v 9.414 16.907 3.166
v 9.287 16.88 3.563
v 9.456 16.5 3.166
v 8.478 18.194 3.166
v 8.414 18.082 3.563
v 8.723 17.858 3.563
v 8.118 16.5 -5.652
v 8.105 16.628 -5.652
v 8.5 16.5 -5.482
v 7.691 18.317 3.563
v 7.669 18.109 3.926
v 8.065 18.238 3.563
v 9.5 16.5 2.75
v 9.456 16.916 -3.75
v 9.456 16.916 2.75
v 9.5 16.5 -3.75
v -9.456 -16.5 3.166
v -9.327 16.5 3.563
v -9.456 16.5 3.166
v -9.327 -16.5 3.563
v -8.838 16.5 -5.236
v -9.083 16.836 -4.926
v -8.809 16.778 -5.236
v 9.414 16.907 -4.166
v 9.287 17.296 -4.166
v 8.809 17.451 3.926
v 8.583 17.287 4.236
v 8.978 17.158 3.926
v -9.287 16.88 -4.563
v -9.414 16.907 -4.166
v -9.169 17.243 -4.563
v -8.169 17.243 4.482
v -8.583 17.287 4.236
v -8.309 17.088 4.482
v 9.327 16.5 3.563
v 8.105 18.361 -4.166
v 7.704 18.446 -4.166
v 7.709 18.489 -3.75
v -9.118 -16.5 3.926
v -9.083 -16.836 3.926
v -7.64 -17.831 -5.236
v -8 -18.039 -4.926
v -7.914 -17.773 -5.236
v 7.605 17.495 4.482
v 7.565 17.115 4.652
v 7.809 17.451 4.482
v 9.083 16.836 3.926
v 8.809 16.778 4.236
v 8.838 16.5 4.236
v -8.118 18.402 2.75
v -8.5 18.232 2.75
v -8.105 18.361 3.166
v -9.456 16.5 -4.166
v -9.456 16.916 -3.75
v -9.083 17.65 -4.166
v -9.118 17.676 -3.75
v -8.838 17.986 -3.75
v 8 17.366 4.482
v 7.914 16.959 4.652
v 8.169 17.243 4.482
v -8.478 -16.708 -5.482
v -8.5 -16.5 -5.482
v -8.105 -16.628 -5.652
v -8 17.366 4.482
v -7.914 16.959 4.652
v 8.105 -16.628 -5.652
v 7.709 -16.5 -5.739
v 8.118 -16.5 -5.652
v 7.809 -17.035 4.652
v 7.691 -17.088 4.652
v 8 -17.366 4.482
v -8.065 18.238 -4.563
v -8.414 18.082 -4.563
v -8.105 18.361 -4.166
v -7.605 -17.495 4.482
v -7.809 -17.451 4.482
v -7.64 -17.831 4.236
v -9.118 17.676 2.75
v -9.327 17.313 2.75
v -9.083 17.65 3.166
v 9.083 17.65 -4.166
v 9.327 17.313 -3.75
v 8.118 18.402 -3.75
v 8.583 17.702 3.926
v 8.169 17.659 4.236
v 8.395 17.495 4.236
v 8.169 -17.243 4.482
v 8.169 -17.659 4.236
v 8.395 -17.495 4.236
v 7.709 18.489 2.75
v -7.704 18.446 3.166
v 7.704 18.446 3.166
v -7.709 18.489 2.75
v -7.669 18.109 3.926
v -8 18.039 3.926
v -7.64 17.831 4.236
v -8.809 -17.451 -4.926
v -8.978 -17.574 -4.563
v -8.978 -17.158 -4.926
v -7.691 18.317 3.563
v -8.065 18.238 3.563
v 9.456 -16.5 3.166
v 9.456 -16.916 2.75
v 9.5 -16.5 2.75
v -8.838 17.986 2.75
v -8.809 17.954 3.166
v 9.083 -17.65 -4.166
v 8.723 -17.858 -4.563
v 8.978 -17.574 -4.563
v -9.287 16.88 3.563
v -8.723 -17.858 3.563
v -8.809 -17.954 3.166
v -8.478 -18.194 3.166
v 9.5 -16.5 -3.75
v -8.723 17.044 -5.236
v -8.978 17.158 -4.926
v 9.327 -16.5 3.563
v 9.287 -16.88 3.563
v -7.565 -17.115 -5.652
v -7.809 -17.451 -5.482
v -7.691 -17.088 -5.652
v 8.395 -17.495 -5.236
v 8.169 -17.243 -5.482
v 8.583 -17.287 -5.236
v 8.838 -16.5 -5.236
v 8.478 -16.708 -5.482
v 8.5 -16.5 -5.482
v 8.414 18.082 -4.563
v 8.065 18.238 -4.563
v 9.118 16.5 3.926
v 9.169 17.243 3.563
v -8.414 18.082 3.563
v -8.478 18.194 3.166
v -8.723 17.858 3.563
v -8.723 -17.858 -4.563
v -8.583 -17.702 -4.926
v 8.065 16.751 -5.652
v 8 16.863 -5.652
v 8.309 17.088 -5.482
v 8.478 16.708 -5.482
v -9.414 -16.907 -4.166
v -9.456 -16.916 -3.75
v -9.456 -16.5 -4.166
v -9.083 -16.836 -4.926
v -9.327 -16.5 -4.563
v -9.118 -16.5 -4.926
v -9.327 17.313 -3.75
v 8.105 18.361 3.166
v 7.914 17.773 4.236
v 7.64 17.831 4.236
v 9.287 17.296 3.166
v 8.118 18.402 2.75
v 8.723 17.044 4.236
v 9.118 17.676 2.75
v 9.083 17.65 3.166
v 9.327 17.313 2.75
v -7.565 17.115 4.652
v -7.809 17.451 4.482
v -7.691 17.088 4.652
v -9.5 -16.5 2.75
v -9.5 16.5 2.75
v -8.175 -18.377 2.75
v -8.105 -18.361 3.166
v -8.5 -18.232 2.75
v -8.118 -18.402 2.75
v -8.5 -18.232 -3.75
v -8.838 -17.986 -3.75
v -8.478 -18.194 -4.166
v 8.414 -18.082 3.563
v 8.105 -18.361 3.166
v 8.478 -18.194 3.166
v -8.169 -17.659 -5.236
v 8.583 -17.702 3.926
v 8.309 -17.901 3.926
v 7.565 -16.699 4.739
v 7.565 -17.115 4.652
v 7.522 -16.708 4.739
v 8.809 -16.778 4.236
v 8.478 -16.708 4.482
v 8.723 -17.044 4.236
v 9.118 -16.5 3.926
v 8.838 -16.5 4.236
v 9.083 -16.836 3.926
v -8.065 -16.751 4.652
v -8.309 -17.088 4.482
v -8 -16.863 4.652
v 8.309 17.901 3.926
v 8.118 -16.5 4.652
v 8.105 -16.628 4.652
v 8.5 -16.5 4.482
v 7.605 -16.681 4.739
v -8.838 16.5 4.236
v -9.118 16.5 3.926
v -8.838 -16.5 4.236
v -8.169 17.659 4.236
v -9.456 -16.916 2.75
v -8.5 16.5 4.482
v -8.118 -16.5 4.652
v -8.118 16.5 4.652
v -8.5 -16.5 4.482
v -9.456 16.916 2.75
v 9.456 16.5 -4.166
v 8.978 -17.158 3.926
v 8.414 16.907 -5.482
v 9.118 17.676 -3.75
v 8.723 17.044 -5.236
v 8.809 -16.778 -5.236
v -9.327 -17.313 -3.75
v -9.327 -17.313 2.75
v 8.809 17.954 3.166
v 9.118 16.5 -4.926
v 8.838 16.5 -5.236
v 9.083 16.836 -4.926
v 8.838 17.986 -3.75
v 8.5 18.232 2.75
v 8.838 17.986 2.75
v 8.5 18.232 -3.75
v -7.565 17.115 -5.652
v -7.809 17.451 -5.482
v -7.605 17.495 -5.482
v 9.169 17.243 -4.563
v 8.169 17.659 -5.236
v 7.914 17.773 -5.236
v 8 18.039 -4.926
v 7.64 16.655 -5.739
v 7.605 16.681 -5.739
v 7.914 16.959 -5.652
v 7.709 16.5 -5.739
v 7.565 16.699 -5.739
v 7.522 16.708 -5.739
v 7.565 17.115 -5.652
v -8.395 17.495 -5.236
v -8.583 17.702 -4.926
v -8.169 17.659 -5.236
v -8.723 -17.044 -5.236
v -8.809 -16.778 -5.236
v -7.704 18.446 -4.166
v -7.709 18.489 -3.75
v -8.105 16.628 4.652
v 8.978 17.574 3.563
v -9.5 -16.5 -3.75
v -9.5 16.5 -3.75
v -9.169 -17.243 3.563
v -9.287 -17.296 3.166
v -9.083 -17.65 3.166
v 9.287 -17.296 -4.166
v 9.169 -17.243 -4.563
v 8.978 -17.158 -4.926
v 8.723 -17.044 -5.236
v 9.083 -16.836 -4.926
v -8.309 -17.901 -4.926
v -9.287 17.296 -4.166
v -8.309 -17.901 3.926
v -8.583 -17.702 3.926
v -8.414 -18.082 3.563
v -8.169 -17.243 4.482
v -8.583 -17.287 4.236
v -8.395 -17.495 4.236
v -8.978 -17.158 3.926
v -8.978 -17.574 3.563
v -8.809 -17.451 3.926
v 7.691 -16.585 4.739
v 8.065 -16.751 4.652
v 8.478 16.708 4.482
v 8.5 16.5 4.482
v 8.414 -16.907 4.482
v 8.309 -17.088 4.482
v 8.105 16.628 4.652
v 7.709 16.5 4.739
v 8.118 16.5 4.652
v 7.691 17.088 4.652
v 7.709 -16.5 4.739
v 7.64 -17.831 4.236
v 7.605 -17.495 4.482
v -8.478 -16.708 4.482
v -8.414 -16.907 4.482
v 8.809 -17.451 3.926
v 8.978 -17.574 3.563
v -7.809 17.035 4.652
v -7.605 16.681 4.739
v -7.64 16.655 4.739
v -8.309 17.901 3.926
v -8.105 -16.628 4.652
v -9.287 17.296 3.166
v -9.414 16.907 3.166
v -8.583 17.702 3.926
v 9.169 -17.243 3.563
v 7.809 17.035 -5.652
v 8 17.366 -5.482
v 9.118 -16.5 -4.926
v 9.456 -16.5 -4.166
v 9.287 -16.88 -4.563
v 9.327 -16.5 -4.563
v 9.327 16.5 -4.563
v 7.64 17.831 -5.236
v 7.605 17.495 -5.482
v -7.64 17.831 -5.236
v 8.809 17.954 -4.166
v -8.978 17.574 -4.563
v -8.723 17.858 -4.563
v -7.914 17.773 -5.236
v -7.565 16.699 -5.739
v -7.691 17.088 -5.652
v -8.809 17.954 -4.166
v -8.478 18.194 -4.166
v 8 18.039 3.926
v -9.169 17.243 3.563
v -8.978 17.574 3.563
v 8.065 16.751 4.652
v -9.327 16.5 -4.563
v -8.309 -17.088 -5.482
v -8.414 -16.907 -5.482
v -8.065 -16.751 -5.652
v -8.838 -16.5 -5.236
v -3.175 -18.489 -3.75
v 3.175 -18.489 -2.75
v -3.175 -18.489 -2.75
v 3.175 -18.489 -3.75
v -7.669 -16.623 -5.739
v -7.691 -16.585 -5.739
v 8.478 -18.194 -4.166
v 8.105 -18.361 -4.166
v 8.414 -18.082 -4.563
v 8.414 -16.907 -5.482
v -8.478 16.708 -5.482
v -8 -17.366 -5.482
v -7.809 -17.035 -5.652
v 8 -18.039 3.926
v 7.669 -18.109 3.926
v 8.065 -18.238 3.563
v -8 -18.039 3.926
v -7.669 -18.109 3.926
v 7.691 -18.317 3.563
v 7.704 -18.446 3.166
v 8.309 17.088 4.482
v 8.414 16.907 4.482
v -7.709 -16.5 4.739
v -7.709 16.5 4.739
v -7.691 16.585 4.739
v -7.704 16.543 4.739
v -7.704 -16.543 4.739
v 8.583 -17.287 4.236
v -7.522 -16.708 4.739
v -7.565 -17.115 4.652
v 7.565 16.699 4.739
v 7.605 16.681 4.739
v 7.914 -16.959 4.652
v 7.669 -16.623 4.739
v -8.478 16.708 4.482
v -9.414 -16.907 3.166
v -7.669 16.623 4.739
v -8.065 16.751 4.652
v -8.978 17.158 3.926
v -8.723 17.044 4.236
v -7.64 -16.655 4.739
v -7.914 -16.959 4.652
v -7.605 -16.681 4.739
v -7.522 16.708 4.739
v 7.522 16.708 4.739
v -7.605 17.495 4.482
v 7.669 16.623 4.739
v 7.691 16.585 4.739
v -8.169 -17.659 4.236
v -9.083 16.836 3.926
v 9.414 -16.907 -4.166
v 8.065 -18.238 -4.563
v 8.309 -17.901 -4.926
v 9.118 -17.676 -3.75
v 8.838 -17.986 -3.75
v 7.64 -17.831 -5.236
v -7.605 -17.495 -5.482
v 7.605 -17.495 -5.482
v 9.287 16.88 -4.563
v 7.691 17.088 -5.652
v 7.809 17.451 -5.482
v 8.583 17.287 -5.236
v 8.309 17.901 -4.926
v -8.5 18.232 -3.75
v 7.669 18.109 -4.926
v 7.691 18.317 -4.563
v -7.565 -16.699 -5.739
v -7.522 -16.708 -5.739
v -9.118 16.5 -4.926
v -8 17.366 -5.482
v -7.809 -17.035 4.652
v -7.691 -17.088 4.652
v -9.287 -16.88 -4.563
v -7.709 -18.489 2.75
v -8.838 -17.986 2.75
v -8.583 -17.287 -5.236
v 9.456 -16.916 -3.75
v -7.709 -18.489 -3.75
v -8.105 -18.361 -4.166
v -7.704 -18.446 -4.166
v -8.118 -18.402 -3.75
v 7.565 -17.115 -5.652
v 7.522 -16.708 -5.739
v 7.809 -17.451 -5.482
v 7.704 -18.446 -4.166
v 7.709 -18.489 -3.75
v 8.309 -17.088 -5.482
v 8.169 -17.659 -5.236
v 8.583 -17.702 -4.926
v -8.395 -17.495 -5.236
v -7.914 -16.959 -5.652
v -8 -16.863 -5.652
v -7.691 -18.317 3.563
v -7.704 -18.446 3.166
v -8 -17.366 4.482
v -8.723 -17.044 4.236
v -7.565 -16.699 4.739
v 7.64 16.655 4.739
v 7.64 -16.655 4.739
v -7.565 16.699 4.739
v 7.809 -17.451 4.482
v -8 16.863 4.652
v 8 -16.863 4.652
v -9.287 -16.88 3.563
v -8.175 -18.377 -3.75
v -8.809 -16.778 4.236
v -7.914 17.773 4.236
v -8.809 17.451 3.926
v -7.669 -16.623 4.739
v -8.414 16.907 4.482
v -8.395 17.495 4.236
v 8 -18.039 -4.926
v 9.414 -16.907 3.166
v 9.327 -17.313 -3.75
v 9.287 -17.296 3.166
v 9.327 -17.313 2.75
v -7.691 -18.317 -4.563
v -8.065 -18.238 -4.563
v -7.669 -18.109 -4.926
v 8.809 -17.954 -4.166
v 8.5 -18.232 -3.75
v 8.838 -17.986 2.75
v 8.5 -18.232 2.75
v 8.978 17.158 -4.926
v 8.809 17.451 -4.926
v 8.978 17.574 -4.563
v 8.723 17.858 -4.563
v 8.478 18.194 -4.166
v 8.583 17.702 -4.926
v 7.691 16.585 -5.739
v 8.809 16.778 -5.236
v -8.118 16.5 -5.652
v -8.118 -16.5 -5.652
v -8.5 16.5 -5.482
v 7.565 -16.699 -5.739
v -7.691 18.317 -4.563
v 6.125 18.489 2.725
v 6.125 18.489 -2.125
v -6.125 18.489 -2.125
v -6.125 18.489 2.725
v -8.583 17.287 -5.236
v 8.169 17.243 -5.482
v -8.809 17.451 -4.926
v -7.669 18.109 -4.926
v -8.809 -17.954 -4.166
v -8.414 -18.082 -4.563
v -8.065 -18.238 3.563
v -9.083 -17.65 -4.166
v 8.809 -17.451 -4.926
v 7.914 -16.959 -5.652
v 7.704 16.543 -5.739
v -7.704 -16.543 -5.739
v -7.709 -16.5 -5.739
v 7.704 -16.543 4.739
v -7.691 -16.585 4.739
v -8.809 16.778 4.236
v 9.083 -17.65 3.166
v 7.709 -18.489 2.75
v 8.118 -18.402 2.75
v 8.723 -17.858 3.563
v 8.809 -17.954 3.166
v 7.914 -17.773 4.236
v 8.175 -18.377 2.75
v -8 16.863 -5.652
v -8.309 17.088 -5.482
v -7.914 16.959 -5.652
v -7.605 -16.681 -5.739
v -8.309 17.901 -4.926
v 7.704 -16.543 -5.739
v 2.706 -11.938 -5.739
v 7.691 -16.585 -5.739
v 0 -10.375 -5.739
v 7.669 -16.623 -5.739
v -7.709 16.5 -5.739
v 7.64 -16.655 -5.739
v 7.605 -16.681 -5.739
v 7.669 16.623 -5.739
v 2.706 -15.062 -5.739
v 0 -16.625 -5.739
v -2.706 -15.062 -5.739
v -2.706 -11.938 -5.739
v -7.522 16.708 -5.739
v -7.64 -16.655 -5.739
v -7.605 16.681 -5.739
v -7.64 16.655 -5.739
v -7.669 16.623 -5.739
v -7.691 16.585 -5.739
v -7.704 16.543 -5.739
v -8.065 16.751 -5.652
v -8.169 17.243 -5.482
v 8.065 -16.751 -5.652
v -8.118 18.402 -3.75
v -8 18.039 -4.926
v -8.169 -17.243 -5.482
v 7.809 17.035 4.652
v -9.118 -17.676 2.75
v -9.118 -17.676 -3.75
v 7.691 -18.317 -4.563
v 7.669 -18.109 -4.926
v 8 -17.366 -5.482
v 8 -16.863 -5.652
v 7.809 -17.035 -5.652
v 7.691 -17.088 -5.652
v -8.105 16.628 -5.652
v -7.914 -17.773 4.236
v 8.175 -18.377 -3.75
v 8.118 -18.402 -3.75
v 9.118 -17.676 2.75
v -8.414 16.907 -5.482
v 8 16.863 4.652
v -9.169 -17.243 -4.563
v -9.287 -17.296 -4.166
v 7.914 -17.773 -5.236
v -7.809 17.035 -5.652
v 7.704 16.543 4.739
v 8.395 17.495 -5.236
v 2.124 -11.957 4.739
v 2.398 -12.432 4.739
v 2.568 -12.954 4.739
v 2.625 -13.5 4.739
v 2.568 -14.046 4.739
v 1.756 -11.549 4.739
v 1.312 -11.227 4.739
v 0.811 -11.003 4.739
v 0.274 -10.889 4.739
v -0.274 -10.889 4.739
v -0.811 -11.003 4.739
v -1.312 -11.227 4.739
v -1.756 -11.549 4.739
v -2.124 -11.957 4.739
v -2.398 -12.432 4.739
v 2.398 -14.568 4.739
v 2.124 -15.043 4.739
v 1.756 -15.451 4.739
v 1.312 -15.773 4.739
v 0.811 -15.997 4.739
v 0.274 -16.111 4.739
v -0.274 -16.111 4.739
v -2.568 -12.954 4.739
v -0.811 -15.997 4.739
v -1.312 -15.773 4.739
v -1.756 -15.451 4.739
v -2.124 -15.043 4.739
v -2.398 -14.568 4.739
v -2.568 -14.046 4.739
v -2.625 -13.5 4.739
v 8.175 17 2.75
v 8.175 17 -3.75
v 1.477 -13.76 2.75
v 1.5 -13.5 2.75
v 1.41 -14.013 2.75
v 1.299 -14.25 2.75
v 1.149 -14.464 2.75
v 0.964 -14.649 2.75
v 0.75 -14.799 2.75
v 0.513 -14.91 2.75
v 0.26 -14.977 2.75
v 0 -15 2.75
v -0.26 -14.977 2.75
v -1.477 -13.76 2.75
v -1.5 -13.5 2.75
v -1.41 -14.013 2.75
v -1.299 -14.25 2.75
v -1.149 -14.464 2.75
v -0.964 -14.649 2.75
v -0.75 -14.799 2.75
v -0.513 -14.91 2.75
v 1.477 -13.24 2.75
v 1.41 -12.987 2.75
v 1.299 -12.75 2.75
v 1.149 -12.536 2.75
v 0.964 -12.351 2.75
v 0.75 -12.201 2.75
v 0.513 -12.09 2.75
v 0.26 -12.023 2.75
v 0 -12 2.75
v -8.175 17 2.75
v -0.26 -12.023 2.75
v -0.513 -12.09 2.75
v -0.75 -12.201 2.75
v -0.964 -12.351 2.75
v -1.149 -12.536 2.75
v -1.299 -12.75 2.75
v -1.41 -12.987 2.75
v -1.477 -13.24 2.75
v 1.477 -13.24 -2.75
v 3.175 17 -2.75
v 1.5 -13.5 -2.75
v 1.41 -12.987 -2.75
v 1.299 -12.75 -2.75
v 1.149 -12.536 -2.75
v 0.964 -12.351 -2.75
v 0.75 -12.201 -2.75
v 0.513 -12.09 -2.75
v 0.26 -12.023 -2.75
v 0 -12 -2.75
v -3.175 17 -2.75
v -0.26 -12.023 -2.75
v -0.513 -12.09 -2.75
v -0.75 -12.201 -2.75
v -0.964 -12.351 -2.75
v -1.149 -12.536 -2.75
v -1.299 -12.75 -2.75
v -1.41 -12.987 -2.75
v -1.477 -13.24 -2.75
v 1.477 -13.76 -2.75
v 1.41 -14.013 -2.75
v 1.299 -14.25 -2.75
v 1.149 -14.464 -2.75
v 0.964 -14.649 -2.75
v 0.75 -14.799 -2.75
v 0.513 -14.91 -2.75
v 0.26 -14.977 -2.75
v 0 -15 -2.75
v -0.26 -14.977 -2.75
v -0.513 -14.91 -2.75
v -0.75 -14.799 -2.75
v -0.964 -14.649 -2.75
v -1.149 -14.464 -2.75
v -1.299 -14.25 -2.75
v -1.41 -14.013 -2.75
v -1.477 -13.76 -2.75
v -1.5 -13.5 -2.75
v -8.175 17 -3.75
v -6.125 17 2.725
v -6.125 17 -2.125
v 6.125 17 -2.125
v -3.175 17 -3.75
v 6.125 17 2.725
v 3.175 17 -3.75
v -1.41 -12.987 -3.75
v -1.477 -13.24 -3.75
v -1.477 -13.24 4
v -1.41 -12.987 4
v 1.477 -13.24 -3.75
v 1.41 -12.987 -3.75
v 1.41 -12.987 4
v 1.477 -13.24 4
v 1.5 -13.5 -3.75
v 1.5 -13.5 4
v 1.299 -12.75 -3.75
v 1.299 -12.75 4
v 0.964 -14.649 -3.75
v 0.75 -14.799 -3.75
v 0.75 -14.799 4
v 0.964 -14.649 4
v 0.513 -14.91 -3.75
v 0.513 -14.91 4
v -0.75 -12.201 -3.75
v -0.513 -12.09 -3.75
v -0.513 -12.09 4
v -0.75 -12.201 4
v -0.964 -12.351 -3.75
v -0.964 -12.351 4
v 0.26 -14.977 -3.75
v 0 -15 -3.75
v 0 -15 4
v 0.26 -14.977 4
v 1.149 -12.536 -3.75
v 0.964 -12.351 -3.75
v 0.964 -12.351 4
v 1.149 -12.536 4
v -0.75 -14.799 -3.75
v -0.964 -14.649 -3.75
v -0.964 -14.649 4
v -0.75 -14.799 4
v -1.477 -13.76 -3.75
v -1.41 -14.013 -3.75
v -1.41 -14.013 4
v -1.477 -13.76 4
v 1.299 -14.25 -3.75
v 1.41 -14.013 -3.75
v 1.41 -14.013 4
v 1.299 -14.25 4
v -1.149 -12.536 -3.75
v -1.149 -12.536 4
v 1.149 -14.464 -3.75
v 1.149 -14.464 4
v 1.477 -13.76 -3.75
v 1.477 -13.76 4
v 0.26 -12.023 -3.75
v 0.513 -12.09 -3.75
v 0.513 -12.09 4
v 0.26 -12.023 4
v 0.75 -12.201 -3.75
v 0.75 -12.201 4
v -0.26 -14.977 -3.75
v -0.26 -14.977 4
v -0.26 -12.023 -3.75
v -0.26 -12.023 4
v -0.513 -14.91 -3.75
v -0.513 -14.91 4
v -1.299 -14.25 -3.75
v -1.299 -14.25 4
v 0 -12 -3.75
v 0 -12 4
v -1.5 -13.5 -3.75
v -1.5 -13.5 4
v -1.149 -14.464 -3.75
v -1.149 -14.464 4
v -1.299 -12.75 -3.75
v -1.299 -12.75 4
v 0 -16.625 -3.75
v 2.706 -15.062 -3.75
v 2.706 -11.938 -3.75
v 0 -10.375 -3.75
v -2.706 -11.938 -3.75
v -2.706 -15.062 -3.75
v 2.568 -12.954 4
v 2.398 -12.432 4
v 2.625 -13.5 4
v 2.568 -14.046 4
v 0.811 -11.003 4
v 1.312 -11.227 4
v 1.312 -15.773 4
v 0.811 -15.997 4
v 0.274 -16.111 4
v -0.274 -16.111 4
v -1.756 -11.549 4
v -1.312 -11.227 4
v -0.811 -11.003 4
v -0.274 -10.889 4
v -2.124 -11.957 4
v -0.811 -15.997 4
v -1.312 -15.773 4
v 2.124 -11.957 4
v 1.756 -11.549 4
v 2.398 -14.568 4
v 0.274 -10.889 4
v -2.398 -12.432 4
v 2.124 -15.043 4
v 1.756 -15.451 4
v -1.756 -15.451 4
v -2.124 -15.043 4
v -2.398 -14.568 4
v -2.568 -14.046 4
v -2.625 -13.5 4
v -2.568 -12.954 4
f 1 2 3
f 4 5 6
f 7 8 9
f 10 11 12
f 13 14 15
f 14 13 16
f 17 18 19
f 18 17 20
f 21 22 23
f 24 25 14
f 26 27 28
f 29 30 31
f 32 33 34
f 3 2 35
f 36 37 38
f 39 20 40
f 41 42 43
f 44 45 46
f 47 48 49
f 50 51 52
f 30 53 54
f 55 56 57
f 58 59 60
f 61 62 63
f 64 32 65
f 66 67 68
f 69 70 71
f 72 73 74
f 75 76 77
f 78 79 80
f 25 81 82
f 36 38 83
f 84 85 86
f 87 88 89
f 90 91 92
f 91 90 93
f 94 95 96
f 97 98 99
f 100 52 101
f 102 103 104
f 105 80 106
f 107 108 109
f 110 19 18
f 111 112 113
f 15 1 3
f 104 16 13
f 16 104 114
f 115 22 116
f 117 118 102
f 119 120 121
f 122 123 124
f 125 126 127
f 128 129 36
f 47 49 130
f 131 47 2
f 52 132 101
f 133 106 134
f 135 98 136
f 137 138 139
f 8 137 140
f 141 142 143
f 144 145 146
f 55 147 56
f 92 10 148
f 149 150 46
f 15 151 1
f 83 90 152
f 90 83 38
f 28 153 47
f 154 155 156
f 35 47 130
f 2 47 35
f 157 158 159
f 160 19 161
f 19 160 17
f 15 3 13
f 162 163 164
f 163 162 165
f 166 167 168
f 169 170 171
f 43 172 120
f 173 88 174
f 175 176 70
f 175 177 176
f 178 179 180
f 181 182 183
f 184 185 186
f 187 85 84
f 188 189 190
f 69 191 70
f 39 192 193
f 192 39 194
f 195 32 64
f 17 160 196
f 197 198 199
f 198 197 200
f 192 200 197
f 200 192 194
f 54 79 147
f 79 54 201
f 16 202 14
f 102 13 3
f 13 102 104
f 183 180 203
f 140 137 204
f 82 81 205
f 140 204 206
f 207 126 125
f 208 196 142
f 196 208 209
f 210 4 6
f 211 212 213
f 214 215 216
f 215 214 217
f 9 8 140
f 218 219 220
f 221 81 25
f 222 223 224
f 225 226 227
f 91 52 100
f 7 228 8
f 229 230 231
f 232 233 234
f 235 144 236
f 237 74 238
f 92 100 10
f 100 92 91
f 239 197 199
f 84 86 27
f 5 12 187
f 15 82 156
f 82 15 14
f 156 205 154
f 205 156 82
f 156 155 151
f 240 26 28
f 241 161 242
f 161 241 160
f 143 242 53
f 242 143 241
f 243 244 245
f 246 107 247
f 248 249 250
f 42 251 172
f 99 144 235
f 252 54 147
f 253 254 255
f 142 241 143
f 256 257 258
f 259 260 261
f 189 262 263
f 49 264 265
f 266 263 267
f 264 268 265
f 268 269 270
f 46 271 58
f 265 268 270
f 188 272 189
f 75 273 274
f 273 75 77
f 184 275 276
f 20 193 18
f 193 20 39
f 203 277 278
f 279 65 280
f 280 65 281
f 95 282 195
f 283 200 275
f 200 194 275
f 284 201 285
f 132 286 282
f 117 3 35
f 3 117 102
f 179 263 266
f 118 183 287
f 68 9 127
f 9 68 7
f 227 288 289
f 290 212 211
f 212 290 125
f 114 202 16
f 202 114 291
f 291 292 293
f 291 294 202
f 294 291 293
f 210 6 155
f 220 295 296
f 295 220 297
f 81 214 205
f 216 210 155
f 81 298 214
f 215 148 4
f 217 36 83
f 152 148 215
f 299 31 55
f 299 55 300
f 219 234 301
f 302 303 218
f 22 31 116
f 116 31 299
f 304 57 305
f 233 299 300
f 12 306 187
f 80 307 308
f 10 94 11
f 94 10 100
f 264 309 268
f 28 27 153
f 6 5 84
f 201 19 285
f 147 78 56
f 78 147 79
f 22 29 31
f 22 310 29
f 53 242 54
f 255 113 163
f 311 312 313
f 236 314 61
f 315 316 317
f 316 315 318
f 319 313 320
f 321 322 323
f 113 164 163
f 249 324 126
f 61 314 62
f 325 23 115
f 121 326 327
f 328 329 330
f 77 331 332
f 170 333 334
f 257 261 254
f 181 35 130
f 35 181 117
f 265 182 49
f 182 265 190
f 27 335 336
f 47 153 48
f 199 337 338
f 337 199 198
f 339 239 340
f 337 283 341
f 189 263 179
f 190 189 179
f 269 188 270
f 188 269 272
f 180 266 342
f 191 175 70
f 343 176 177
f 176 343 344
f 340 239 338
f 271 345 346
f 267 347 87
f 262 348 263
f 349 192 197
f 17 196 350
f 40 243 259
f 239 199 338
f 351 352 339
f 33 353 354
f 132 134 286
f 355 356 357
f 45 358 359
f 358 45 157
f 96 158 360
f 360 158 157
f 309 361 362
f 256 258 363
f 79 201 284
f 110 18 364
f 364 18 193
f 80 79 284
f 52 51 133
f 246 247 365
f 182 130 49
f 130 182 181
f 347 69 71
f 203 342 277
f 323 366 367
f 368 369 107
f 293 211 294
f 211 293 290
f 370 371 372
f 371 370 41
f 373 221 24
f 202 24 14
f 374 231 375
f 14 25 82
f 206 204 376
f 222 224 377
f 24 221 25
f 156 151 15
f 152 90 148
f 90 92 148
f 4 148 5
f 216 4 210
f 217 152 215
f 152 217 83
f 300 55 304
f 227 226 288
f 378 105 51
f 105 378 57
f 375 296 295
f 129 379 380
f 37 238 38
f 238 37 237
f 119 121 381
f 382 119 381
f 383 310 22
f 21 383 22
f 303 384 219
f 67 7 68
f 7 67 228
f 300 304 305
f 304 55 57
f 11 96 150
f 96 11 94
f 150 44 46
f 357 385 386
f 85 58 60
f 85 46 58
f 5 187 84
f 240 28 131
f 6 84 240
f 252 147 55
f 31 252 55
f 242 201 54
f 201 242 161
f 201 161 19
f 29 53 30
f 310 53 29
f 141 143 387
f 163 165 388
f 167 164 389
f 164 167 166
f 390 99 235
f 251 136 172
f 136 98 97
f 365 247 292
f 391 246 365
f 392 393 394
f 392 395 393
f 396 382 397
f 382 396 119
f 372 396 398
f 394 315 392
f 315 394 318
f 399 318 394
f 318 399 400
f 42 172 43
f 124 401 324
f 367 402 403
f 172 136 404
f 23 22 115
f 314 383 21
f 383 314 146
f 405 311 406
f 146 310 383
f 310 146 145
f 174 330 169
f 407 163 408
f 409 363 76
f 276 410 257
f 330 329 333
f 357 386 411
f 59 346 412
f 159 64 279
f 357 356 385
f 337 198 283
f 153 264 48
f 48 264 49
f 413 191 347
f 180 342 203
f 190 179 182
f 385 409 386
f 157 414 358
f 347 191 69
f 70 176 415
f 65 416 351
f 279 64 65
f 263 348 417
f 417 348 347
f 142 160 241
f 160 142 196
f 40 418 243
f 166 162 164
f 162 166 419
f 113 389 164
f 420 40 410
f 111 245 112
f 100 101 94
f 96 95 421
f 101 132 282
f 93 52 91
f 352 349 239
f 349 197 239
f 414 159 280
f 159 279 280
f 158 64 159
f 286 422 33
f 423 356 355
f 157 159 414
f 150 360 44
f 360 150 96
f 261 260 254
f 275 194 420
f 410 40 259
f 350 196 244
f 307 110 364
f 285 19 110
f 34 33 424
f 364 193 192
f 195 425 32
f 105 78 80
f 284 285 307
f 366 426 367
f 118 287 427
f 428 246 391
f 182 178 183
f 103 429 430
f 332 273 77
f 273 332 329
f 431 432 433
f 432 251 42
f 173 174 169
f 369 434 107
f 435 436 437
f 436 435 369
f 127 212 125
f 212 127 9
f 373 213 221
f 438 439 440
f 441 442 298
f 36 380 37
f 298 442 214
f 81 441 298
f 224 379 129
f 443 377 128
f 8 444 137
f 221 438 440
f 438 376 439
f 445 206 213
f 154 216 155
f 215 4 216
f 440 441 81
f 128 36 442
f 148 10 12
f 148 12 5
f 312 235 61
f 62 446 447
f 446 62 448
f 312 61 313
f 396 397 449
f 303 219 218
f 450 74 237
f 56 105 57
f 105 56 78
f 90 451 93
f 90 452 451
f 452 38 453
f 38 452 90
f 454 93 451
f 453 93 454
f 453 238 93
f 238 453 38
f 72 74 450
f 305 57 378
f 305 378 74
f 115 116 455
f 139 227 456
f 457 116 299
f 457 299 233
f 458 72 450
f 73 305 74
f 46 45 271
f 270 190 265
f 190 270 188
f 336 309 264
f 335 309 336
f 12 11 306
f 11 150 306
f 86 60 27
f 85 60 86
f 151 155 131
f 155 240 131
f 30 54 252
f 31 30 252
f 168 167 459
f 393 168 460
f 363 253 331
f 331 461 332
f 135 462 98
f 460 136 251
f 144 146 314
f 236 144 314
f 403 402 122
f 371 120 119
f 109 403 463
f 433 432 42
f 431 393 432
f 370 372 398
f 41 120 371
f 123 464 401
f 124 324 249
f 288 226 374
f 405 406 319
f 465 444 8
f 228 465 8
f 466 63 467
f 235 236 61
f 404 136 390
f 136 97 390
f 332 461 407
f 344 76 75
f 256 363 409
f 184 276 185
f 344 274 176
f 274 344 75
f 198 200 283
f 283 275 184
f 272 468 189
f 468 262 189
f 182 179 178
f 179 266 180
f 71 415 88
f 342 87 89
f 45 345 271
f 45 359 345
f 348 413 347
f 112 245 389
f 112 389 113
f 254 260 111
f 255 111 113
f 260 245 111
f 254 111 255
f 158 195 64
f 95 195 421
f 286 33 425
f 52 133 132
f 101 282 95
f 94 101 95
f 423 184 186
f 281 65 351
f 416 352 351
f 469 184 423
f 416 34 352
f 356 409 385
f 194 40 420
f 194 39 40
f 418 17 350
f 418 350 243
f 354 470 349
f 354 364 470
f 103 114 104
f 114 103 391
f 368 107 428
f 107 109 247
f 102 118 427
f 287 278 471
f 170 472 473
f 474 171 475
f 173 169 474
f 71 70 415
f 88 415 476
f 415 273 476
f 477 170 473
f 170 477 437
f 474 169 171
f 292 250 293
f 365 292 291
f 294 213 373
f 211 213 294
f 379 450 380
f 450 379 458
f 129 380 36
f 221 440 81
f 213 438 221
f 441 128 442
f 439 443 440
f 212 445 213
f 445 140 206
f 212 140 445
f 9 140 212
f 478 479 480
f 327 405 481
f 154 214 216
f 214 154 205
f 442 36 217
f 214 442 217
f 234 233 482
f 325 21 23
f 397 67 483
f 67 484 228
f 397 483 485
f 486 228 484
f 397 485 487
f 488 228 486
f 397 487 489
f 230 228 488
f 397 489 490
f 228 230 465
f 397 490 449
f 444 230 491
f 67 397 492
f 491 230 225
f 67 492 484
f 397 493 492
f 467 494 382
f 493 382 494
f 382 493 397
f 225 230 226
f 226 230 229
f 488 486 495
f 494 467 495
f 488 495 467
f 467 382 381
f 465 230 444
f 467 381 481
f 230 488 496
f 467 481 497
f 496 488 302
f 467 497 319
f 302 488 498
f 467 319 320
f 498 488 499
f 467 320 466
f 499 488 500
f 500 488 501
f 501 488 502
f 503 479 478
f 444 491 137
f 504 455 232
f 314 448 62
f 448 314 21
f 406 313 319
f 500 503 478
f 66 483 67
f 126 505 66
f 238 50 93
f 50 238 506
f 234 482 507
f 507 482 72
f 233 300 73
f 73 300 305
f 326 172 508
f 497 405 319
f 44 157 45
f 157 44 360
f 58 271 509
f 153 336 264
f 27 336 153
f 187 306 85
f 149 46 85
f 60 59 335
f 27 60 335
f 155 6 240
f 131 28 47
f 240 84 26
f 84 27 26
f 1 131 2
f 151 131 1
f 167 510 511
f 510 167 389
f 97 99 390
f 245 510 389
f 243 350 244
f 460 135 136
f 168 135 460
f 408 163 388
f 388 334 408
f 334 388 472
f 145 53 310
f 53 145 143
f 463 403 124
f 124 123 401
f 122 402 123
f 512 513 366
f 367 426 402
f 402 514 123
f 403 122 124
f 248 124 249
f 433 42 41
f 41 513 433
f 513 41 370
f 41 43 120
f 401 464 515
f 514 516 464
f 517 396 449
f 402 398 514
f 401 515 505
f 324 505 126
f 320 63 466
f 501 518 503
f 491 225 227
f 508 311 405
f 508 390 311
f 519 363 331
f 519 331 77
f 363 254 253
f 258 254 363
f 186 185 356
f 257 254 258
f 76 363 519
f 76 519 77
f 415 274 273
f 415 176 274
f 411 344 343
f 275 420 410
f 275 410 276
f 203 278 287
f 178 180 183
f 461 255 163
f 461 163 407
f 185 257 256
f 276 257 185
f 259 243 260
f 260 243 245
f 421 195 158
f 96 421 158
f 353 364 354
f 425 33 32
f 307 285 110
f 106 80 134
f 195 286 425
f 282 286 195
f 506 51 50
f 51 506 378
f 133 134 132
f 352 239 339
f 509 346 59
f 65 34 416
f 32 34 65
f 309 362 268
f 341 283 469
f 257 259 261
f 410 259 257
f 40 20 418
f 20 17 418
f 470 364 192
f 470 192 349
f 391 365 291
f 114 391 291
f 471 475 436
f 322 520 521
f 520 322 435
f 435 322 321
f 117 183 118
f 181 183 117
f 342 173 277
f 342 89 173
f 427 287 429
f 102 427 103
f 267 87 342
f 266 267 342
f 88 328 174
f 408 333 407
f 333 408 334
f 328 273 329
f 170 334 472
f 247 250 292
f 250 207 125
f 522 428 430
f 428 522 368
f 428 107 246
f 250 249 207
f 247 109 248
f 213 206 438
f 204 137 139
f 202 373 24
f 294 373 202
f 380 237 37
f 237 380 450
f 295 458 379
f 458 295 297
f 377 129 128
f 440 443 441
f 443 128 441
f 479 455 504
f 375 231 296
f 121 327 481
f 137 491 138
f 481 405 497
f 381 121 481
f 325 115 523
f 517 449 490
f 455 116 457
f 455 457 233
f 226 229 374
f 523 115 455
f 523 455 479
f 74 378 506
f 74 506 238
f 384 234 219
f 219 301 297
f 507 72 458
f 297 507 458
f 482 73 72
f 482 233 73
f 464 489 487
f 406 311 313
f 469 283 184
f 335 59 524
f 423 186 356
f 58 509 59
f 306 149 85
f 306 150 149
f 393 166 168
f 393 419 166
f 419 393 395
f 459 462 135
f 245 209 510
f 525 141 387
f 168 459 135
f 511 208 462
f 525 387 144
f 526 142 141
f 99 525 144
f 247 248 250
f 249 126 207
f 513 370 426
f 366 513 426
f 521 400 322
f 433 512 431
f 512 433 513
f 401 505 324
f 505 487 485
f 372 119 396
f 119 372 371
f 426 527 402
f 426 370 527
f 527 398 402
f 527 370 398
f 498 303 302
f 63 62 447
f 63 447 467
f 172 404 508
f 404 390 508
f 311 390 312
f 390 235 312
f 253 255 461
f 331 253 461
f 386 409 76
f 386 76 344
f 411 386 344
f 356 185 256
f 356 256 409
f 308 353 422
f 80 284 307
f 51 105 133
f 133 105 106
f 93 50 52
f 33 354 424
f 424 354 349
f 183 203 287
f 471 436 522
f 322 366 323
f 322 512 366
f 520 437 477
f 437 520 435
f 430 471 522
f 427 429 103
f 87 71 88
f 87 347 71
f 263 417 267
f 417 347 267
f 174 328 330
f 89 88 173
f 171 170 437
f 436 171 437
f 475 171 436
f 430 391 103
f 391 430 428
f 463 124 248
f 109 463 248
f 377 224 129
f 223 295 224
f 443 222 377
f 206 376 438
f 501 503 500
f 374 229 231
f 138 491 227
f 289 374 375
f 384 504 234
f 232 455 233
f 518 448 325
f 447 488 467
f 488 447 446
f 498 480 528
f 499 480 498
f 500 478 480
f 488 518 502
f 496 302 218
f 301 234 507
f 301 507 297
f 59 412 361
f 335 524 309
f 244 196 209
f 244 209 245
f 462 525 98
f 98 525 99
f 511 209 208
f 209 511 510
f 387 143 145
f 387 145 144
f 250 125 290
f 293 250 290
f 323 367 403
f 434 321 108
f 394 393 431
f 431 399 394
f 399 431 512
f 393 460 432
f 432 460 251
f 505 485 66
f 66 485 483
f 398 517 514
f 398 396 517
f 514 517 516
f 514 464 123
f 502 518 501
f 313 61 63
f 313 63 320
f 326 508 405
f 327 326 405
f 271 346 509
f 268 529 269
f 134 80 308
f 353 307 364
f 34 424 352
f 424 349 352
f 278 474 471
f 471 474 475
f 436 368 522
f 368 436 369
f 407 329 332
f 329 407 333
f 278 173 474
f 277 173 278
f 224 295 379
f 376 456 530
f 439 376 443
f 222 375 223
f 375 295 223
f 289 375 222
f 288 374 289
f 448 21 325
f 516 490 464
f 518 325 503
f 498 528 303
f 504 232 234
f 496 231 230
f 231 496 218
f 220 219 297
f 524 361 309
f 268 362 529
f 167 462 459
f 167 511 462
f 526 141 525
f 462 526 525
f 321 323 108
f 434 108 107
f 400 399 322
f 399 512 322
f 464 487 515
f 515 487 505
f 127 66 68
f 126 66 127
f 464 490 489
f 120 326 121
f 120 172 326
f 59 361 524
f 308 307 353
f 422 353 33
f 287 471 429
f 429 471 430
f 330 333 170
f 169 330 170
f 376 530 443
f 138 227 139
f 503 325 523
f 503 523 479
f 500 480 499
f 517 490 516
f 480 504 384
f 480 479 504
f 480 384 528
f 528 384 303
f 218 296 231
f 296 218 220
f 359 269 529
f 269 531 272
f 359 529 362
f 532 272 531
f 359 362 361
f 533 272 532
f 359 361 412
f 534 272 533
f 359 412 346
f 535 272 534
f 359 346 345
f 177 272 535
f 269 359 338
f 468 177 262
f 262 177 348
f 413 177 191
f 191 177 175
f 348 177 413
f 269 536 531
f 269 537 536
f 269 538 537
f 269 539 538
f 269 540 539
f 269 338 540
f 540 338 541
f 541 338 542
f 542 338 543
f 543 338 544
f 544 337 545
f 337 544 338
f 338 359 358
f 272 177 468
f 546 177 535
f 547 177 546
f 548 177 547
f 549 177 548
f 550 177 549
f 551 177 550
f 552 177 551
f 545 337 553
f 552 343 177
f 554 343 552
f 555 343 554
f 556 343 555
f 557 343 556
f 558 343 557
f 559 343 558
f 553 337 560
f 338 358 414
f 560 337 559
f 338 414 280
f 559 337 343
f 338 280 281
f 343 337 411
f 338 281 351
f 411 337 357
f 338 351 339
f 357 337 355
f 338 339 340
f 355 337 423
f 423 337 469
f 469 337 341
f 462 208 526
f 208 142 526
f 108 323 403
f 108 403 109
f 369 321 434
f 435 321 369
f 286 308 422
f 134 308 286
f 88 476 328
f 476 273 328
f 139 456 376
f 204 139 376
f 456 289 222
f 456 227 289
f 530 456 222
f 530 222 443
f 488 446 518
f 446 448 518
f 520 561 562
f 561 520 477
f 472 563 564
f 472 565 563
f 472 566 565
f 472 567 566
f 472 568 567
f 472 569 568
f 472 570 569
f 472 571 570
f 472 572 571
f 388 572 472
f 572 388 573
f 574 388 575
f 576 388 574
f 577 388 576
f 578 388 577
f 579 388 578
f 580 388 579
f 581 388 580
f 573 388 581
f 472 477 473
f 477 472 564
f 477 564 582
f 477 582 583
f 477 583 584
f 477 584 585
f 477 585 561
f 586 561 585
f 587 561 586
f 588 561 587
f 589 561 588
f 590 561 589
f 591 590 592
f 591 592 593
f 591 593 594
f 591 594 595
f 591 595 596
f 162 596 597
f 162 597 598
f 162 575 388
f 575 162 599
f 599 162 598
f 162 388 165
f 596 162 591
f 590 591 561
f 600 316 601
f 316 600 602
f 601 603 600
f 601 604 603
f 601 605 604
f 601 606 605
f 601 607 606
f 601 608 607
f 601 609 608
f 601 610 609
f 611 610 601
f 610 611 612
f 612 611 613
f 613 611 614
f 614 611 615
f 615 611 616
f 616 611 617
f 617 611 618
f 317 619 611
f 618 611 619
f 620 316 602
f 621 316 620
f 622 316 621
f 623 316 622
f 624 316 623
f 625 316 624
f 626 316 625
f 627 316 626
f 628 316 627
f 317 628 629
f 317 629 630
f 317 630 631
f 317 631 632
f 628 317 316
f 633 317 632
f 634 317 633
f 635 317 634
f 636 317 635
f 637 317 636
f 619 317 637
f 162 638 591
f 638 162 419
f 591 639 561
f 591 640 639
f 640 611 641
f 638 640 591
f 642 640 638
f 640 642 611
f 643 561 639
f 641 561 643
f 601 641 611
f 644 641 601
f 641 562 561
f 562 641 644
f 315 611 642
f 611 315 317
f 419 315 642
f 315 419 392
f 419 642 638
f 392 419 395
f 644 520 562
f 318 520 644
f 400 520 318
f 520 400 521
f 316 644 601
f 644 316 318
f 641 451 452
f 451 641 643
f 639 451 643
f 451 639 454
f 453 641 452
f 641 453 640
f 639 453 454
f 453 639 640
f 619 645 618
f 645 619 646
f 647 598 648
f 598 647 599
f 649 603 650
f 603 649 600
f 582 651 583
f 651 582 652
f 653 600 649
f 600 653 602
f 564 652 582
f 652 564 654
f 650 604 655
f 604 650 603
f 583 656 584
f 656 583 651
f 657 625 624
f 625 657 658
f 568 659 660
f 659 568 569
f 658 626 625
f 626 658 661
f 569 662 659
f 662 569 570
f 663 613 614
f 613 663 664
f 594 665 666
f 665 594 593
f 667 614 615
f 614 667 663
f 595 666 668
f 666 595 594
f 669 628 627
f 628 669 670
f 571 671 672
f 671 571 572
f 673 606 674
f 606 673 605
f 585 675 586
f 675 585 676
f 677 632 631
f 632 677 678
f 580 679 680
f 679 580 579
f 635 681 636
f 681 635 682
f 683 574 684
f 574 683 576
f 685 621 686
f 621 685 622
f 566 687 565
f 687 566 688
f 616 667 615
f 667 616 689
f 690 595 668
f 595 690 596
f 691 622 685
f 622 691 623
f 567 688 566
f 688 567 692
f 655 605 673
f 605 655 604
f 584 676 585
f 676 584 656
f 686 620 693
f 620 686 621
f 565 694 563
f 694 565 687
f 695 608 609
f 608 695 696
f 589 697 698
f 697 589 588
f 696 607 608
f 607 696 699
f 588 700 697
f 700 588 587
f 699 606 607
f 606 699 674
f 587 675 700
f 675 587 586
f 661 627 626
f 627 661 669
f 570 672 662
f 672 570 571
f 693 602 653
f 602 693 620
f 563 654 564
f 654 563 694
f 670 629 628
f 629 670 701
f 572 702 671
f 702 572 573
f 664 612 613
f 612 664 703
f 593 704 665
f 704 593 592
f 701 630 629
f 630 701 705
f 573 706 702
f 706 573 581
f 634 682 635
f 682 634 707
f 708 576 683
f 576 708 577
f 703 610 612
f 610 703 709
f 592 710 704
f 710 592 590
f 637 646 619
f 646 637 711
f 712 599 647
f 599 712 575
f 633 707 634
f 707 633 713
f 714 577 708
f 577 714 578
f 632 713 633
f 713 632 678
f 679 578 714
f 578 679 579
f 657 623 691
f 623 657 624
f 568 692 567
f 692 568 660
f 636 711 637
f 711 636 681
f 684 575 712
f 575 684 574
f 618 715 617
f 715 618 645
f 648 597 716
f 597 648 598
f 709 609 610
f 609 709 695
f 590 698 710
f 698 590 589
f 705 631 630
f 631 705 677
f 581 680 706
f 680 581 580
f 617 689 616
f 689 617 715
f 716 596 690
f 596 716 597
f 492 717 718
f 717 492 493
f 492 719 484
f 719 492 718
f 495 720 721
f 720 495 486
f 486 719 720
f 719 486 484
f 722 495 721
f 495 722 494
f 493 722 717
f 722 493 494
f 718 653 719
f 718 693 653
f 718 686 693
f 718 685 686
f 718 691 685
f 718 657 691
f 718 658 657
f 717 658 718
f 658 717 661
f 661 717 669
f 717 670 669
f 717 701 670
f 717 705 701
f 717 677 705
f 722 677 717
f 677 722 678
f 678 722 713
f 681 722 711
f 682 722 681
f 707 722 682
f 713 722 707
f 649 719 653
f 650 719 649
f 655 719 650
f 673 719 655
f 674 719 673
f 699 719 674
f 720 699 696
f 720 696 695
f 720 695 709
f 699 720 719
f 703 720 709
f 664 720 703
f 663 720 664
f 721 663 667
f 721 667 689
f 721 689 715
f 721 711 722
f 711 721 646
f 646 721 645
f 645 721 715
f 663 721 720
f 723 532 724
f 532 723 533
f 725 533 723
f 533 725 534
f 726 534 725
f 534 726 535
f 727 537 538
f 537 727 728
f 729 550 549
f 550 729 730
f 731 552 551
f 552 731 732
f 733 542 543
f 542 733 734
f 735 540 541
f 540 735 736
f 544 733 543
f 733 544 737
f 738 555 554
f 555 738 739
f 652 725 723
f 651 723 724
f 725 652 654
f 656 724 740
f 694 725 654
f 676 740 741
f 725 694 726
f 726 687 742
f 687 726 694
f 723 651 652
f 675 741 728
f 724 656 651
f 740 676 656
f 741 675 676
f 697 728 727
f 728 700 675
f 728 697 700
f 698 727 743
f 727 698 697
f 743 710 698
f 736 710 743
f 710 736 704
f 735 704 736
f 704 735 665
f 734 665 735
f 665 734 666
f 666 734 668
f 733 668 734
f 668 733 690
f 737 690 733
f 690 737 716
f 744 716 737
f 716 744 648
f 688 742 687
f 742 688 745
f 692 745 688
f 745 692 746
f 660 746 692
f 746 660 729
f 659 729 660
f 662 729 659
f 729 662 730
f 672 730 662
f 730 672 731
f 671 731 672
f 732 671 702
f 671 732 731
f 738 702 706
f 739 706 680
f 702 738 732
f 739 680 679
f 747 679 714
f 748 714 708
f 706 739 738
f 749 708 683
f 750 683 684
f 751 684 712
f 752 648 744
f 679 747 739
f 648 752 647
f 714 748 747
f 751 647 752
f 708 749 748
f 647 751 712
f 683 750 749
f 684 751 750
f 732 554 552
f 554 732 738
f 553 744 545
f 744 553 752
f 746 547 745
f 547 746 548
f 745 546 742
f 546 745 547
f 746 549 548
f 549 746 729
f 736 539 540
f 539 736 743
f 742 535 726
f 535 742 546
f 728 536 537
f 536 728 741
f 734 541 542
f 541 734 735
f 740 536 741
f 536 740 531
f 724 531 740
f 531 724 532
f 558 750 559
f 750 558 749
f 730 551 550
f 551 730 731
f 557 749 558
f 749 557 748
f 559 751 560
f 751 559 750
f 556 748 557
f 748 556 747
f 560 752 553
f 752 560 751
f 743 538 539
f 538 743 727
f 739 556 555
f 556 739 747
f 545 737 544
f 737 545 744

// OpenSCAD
/*
 * Einszeit Enclosure
 * Copyright (c) 2025 Lone Dynamics Corporation. All rights reserved.
 *
 * required hardware:
 *  - 1 x M2.5 x 10mm countersunk bolt
 *  - 1 x M2.5 nut
 *
 */
 
$fn = 30;

box_width = 19;
box_length = 37;
box_height = 10.5;
box_thickness = 2.0;

lid_thickness = 3;

cutout_width = 16.10;
cutout_length = 44;
cutout_height = 5.5;

cutout_usb_width = 12;

board_height = 1.4;

roundness = 2;

toladj = 0.25;

//ldp_board(-0.5);
translate([0,0,-0.5]) ldp_case();
//translate([0,0,-0.25]) ldp_endcap();

// m2.5 bolt
//translate([0,-13.5,-6.25]) color([1,0,0]) cylinder(d=2.5, h=12, $fn=36);

// m2.5 nut
//translate([0,-13.5,-6.55]) rotate(30) color([1,0,0]) cylinder(d=5.8, h=2.4, $fn=6);

module ldp_endcap()
{
    		 	
	difference() {
		union() {
			translate([0,-13.5,-0.5]) color([0,0,1]) cylinder(d=6, h=3.5, $fn=36);
			translate([0,-15.75,-0.25]) cube([16.1,5.5,6.5], center=true);
		}
		translate([0,-13.5,-4.25]) color([1,0,0]) cylinder(d=3, h=8, $fn=36);
        color([1,0,0]) translate([0,0,-5.5]) cube([6.5,100,6], center=true);

	}
}

module ldp_board(o)
{

	difference() {
		union() {
			translate([0,2,o])
				color([0.0,0.8,0.0]) cube([16, 26, 1.6], center=true);
			translate([0,23,o+1])
				color([0.9,0.9,0.9]) cube([12, 15, 4.5], center=true);
		}

	}
	
}

module ldp_case()
{

	difference() {
		
		minkowski() {
			cube([box_width-(roundness*2),box_length-(roundness*2),box_height-(roundness*2)],
				center=true);
			sphere(roundness);
		}	
        
		translate([0,-5,(box_height-cutout_height)/2-2])
			cube([cutout_width+toladj,cutout_length,cutout_height], center=true);

		translate([-5.675,-5,(box_height-cutout_height)/2-3])
			cube([5,cutout_length,cutout_height], center=true);
		
		translate([5.675,-5,(box_height-cutout_height)/2-3])
			cube([5,cutout_length,cutout_height], center=true);

		// USB cutout
        translate([0,15,0.8])
            cube([cutout_usb_width+toladj,10,4.6+toladj], center=true);
        
		// bolt hole
		translate([0,-13.5,-5]) cylinder(d=2.75+toladj, h=100, $fn=36);
		
		// nut cutout
		translate([0,-13.5,-5.75]) rotate(30) cylinder(d=6+toladj, h=2.5, $fn=6);
    
        // lid notch cutout
        translate([0,-13.5,4.5]) cylinder(d=5+toladj, h=100);

//        translate([-1.5,2.5,5.1]) rotate([0,0,270])
//            linear_extrude(0.3)
//                text("EINSZEIT", size=3.5, halign="center", font="Lato Black");

	}

}
